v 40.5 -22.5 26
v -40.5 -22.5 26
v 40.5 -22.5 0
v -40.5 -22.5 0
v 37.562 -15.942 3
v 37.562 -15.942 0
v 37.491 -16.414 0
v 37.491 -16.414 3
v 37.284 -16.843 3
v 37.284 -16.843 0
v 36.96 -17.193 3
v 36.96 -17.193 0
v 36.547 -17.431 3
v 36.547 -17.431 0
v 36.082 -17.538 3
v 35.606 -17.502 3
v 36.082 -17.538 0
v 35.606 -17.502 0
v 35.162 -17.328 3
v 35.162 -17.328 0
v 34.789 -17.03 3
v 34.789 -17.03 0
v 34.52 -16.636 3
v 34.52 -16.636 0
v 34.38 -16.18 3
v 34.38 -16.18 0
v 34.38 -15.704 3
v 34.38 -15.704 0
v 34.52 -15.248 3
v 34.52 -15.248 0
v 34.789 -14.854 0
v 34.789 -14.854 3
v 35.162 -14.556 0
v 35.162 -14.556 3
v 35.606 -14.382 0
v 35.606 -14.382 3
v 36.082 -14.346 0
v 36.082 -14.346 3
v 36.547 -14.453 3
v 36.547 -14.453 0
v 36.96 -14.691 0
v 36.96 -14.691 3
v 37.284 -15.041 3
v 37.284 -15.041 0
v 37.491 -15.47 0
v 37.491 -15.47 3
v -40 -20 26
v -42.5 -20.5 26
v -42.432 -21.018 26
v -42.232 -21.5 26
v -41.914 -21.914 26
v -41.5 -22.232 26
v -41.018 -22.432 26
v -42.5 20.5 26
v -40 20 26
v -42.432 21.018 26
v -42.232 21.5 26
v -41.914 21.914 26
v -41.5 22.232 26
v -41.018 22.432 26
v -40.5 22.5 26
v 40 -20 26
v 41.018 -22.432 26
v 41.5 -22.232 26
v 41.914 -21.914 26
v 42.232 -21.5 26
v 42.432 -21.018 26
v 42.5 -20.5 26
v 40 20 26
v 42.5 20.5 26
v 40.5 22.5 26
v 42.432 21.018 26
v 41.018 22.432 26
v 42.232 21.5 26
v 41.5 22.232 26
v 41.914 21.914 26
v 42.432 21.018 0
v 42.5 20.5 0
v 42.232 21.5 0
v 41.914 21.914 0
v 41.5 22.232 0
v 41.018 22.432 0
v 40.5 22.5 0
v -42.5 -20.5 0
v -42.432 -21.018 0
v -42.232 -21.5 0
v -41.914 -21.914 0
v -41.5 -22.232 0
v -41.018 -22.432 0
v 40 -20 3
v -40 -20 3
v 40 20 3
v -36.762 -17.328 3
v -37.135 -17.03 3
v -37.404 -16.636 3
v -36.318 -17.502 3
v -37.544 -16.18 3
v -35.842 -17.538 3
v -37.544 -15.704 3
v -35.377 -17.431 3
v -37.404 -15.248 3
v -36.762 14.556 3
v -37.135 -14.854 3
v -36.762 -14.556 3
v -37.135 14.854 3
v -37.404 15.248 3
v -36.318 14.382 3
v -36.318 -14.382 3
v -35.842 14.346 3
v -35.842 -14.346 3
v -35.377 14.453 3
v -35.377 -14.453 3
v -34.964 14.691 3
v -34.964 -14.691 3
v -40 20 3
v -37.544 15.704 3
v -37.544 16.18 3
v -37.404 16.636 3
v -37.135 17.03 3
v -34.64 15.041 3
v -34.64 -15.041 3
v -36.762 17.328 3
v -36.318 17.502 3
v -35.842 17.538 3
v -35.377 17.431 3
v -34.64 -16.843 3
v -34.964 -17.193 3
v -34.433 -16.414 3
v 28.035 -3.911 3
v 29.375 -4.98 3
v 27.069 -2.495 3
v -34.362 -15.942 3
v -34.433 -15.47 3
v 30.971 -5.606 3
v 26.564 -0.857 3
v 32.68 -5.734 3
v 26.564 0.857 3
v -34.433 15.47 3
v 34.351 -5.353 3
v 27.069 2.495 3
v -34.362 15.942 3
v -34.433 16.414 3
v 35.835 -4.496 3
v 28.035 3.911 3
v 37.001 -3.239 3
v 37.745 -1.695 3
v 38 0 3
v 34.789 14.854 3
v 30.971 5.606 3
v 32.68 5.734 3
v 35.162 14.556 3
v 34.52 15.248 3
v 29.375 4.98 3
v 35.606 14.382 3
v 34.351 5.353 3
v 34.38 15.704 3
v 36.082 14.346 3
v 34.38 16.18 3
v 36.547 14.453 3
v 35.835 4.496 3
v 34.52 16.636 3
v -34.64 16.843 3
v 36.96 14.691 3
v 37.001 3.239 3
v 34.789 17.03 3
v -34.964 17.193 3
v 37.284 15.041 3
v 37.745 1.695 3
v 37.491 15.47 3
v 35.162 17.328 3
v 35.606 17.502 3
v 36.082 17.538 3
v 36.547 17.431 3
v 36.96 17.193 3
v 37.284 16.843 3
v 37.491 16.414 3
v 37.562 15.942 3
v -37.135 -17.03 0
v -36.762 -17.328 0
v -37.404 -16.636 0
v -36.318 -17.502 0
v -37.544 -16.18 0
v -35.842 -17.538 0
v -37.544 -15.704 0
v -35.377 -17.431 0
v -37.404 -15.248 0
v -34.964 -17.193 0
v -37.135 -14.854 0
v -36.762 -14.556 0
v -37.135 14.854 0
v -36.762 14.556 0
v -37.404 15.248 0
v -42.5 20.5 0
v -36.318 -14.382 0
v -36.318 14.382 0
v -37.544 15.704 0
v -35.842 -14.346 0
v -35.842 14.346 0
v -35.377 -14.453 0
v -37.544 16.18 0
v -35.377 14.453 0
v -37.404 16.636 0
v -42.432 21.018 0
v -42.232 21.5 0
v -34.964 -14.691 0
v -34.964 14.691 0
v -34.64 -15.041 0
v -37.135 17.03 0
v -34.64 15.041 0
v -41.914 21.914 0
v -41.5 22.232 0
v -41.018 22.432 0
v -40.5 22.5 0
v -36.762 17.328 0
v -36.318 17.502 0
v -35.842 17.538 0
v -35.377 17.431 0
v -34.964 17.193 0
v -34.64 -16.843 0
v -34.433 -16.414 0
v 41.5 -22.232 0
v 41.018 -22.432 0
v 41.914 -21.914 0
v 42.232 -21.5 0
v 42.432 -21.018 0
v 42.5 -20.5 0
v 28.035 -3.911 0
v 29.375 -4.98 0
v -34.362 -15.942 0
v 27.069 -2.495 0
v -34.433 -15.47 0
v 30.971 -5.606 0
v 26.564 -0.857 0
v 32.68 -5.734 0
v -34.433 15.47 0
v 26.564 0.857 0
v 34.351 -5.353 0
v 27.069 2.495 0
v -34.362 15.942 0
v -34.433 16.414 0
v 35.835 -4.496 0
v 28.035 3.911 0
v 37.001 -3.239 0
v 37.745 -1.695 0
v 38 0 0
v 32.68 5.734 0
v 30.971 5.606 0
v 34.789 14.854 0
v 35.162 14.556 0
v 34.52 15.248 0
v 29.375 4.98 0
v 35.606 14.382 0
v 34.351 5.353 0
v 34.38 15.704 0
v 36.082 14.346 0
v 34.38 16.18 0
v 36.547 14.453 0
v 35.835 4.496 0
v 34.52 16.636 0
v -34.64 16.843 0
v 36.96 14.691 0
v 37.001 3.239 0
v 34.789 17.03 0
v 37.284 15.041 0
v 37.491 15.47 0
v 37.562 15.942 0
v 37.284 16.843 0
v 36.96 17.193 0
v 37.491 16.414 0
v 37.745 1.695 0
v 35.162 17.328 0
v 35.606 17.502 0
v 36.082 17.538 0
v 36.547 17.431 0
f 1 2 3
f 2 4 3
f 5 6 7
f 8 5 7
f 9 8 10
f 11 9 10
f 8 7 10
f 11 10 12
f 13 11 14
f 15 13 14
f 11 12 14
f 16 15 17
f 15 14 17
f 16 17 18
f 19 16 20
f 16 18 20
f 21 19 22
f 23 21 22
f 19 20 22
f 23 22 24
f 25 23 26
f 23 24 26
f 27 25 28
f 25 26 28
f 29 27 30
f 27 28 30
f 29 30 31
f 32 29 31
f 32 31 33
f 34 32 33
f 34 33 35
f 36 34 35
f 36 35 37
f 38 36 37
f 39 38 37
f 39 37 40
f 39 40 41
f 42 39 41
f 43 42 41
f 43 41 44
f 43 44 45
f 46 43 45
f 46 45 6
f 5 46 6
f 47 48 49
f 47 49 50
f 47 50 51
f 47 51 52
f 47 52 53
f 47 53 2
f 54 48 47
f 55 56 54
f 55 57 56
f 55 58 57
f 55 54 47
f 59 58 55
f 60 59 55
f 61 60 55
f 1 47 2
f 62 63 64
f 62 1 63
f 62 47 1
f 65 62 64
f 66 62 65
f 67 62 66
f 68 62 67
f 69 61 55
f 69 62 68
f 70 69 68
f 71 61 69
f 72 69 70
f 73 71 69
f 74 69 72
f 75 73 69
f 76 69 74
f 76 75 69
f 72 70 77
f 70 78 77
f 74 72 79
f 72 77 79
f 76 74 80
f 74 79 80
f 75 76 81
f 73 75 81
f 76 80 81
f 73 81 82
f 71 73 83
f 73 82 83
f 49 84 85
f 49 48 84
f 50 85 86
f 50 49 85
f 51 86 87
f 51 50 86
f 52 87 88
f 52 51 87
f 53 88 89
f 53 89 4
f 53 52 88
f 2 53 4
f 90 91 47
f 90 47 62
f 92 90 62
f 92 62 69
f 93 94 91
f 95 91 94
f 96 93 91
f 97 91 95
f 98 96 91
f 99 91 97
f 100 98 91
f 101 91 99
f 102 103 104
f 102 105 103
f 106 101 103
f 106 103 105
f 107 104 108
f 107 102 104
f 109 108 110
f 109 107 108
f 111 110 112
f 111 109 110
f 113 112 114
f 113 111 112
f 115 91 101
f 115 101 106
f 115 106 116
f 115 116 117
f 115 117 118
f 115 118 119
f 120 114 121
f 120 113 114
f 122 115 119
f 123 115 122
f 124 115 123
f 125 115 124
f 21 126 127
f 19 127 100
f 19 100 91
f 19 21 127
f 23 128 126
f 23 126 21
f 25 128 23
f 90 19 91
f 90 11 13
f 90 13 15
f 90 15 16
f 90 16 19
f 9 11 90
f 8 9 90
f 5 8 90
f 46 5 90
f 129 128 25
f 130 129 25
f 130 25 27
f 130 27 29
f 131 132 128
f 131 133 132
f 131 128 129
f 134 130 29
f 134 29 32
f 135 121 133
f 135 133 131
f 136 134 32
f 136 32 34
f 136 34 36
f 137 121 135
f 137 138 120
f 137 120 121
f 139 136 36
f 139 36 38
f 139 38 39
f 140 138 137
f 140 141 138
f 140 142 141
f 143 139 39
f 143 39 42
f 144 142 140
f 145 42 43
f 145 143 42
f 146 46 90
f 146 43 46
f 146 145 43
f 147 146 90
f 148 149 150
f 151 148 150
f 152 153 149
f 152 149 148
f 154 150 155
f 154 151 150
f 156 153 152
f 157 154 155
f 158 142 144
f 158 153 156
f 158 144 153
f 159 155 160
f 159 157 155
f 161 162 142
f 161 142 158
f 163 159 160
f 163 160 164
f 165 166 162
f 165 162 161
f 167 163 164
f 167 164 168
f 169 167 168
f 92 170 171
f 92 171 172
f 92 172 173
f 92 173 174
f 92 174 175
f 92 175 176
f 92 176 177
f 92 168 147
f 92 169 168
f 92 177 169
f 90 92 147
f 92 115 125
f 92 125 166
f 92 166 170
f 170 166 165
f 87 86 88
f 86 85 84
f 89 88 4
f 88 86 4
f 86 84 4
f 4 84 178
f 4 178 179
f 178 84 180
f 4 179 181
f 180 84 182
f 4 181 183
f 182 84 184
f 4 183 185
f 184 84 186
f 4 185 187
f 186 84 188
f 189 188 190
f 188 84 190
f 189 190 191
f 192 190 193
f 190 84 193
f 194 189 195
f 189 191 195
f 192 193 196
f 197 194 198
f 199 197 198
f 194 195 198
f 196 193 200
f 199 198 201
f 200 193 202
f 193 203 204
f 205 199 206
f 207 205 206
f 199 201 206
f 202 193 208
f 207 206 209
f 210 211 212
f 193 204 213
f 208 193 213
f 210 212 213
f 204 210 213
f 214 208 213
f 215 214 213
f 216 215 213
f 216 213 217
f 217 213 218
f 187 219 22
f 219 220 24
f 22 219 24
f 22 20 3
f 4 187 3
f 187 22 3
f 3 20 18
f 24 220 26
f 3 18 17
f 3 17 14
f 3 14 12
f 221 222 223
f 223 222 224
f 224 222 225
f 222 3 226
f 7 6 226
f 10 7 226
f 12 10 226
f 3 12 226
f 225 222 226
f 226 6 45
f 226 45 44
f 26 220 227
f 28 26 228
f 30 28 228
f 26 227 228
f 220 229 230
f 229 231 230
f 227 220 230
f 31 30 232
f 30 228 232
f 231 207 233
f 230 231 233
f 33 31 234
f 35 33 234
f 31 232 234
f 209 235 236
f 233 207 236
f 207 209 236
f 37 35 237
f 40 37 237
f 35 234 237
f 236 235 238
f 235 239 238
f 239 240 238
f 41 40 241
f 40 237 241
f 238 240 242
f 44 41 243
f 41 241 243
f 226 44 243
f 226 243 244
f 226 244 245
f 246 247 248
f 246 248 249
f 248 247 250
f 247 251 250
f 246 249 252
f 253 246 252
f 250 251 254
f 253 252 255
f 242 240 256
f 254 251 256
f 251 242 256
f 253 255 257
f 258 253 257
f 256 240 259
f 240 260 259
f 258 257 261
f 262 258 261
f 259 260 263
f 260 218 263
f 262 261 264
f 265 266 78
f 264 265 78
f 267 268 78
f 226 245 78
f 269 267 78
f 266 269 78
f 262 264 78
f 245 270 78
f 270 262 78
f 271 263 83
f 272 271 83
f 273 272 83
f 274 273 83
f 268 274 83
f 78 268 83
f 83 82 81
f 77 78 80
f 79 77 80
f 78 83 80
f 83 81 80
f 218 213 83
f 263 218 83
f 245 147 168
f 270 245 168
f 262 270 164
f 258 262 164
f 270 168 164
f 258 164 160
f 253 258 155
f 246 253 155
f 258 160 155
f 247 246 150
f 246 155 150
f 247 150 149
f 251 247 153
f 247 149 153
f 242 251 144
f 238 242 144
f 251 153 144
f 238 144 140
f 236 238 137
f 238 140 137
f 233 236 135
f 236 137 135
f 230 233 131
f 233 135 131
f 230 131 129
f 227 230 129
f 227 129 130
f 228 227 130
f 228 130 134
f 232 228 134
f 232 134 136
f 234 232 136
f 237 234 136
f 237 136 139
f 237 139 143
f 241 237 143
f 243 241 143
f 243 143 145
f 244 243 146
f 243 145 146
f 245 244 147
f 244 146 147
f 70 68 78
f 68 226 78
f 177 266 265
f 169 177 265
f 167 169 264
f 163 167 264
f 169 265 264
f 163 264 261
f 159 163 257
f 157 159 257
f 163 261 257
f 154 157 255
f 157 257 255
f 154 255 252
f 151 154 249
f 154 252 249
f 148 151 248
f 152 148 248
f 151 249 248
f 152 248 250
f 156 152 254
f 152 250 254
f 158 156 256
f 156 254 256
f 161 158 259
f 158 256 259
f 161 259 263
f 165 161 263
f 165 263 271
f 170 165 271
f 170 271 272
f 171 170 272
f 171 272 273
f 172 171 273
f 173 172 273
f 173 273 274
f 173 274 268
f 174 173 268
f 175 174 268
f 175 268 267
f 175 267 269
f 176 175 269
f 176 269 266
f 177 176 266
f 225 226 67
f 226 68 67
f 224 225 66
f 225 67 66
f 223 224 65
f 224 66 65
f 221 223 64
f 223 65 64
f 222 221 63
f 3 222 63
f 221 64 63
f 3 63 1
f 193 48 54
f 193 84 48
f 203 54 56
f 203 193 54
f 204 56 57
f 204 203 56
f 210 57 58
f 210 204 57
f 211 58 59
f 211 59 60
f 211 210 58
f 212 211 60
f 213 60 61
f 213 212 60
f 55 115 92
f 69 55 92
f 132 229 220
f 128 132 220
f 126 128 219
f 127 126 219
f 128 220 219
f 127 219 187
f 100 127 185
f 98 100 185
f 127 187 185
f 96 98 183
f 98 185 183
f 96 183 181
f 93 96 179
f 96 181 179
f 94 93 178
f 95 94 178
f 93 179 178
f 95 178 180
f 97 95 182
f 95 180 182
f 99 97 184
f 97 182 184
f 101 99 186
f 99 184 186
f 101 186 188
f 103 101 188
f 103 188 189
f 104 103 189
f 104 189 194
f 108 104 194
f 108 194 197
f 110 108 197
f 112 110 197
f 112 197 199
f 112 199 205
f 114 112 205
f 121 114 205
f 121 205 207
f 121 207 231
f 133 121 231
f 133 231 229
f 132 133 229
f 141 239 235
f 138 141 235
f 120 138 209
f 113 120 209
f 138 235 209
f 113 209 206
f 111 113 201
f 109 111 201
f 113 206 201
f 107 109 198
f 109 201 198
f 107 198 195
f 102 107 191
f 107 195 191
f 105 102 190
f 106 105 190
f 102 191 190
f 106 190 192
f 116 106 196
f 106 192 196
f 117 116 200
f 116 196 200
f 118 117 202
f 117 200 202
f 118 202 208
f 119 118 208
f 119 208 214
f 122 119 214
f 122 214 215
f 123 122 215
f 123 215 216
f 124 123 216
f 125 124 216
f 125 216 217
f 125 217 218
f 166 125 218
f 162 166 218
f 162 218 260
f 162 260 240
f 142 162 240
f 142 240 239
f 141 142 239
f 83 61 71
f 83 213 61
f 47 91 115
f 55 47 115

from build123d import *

# Parameters (mm, degrees)
F0_W     = 85
F0_H     = 45
F0_W_2   = 80
F0_H_2   = 40
F1_DEPTH = 3
F2_DEPTH = 26
F3_R     = 2
F4_R     = 5.75
F5_DEPTH = 3
F6_R     = 1.6
F7_DEPTH = 25


with BuildPart() as f1:
    # F0 (on Top) → F1 (new body)
    with BuildSketch(Plane.XY):
        Rectangle(F0_W, F0_H)
        Rectangle(F0_W_2, F0_H_2, mode=Mode.SUBTRACT)
        Rectangle(F0_W_2, F0_H_2)
    extrude(amount=F1_DEPTH)

    # F0 (on Top) → F2 (join)
    with BuildSketch(Plane.XY):
        Rectangle(F0_W, F0_H)
        Rectangle(F0_W_2, F0_H_2, mode=Mode.SUBTRACT)
    extrude(amount=F2_DEPTH)

    # F3
    f3_edges = [f1.edges().sort_by_distance(p)[0] for p in [
        (-42.5, -22.5, 13),
        (42.5, -22.5, 13),
        (-42.5, 22.5, 13),
        (42.5, 22.5, 13),
    ]]
    fillet(f3_edges, radius=F3_R)

    # F4 (on face) → F5 (cut, through all)
    with BuildSketch(Plane.XY.offset(3)):
        with Locations((32.25, 0)):
            Circle(F4_R)
    extrude(amount=-F5_DEPTH, mode=Mode.SUBTRACT)

    # F6 (on face) → F7 (cut)
    with BuildSketch(Plane(origin=(0, 0, 0), x_dir=(1, 0, 0), z_dir=(0, 0, -1))):
        with Locations((-35.962, -15.942)):
            Circle(F6_R)
        with Locations((-35.962, 15.942)):
            Circle(F6_R)
        with Locations((35.962, 15.942)):
            Circle(F6_R)
        with Locations((35.962, -15.942)):
            Circle(F6_R)
    extrude(amount=-F7_DEPTH, mode=Mode.SUBTRACT)


solid = f1.part
